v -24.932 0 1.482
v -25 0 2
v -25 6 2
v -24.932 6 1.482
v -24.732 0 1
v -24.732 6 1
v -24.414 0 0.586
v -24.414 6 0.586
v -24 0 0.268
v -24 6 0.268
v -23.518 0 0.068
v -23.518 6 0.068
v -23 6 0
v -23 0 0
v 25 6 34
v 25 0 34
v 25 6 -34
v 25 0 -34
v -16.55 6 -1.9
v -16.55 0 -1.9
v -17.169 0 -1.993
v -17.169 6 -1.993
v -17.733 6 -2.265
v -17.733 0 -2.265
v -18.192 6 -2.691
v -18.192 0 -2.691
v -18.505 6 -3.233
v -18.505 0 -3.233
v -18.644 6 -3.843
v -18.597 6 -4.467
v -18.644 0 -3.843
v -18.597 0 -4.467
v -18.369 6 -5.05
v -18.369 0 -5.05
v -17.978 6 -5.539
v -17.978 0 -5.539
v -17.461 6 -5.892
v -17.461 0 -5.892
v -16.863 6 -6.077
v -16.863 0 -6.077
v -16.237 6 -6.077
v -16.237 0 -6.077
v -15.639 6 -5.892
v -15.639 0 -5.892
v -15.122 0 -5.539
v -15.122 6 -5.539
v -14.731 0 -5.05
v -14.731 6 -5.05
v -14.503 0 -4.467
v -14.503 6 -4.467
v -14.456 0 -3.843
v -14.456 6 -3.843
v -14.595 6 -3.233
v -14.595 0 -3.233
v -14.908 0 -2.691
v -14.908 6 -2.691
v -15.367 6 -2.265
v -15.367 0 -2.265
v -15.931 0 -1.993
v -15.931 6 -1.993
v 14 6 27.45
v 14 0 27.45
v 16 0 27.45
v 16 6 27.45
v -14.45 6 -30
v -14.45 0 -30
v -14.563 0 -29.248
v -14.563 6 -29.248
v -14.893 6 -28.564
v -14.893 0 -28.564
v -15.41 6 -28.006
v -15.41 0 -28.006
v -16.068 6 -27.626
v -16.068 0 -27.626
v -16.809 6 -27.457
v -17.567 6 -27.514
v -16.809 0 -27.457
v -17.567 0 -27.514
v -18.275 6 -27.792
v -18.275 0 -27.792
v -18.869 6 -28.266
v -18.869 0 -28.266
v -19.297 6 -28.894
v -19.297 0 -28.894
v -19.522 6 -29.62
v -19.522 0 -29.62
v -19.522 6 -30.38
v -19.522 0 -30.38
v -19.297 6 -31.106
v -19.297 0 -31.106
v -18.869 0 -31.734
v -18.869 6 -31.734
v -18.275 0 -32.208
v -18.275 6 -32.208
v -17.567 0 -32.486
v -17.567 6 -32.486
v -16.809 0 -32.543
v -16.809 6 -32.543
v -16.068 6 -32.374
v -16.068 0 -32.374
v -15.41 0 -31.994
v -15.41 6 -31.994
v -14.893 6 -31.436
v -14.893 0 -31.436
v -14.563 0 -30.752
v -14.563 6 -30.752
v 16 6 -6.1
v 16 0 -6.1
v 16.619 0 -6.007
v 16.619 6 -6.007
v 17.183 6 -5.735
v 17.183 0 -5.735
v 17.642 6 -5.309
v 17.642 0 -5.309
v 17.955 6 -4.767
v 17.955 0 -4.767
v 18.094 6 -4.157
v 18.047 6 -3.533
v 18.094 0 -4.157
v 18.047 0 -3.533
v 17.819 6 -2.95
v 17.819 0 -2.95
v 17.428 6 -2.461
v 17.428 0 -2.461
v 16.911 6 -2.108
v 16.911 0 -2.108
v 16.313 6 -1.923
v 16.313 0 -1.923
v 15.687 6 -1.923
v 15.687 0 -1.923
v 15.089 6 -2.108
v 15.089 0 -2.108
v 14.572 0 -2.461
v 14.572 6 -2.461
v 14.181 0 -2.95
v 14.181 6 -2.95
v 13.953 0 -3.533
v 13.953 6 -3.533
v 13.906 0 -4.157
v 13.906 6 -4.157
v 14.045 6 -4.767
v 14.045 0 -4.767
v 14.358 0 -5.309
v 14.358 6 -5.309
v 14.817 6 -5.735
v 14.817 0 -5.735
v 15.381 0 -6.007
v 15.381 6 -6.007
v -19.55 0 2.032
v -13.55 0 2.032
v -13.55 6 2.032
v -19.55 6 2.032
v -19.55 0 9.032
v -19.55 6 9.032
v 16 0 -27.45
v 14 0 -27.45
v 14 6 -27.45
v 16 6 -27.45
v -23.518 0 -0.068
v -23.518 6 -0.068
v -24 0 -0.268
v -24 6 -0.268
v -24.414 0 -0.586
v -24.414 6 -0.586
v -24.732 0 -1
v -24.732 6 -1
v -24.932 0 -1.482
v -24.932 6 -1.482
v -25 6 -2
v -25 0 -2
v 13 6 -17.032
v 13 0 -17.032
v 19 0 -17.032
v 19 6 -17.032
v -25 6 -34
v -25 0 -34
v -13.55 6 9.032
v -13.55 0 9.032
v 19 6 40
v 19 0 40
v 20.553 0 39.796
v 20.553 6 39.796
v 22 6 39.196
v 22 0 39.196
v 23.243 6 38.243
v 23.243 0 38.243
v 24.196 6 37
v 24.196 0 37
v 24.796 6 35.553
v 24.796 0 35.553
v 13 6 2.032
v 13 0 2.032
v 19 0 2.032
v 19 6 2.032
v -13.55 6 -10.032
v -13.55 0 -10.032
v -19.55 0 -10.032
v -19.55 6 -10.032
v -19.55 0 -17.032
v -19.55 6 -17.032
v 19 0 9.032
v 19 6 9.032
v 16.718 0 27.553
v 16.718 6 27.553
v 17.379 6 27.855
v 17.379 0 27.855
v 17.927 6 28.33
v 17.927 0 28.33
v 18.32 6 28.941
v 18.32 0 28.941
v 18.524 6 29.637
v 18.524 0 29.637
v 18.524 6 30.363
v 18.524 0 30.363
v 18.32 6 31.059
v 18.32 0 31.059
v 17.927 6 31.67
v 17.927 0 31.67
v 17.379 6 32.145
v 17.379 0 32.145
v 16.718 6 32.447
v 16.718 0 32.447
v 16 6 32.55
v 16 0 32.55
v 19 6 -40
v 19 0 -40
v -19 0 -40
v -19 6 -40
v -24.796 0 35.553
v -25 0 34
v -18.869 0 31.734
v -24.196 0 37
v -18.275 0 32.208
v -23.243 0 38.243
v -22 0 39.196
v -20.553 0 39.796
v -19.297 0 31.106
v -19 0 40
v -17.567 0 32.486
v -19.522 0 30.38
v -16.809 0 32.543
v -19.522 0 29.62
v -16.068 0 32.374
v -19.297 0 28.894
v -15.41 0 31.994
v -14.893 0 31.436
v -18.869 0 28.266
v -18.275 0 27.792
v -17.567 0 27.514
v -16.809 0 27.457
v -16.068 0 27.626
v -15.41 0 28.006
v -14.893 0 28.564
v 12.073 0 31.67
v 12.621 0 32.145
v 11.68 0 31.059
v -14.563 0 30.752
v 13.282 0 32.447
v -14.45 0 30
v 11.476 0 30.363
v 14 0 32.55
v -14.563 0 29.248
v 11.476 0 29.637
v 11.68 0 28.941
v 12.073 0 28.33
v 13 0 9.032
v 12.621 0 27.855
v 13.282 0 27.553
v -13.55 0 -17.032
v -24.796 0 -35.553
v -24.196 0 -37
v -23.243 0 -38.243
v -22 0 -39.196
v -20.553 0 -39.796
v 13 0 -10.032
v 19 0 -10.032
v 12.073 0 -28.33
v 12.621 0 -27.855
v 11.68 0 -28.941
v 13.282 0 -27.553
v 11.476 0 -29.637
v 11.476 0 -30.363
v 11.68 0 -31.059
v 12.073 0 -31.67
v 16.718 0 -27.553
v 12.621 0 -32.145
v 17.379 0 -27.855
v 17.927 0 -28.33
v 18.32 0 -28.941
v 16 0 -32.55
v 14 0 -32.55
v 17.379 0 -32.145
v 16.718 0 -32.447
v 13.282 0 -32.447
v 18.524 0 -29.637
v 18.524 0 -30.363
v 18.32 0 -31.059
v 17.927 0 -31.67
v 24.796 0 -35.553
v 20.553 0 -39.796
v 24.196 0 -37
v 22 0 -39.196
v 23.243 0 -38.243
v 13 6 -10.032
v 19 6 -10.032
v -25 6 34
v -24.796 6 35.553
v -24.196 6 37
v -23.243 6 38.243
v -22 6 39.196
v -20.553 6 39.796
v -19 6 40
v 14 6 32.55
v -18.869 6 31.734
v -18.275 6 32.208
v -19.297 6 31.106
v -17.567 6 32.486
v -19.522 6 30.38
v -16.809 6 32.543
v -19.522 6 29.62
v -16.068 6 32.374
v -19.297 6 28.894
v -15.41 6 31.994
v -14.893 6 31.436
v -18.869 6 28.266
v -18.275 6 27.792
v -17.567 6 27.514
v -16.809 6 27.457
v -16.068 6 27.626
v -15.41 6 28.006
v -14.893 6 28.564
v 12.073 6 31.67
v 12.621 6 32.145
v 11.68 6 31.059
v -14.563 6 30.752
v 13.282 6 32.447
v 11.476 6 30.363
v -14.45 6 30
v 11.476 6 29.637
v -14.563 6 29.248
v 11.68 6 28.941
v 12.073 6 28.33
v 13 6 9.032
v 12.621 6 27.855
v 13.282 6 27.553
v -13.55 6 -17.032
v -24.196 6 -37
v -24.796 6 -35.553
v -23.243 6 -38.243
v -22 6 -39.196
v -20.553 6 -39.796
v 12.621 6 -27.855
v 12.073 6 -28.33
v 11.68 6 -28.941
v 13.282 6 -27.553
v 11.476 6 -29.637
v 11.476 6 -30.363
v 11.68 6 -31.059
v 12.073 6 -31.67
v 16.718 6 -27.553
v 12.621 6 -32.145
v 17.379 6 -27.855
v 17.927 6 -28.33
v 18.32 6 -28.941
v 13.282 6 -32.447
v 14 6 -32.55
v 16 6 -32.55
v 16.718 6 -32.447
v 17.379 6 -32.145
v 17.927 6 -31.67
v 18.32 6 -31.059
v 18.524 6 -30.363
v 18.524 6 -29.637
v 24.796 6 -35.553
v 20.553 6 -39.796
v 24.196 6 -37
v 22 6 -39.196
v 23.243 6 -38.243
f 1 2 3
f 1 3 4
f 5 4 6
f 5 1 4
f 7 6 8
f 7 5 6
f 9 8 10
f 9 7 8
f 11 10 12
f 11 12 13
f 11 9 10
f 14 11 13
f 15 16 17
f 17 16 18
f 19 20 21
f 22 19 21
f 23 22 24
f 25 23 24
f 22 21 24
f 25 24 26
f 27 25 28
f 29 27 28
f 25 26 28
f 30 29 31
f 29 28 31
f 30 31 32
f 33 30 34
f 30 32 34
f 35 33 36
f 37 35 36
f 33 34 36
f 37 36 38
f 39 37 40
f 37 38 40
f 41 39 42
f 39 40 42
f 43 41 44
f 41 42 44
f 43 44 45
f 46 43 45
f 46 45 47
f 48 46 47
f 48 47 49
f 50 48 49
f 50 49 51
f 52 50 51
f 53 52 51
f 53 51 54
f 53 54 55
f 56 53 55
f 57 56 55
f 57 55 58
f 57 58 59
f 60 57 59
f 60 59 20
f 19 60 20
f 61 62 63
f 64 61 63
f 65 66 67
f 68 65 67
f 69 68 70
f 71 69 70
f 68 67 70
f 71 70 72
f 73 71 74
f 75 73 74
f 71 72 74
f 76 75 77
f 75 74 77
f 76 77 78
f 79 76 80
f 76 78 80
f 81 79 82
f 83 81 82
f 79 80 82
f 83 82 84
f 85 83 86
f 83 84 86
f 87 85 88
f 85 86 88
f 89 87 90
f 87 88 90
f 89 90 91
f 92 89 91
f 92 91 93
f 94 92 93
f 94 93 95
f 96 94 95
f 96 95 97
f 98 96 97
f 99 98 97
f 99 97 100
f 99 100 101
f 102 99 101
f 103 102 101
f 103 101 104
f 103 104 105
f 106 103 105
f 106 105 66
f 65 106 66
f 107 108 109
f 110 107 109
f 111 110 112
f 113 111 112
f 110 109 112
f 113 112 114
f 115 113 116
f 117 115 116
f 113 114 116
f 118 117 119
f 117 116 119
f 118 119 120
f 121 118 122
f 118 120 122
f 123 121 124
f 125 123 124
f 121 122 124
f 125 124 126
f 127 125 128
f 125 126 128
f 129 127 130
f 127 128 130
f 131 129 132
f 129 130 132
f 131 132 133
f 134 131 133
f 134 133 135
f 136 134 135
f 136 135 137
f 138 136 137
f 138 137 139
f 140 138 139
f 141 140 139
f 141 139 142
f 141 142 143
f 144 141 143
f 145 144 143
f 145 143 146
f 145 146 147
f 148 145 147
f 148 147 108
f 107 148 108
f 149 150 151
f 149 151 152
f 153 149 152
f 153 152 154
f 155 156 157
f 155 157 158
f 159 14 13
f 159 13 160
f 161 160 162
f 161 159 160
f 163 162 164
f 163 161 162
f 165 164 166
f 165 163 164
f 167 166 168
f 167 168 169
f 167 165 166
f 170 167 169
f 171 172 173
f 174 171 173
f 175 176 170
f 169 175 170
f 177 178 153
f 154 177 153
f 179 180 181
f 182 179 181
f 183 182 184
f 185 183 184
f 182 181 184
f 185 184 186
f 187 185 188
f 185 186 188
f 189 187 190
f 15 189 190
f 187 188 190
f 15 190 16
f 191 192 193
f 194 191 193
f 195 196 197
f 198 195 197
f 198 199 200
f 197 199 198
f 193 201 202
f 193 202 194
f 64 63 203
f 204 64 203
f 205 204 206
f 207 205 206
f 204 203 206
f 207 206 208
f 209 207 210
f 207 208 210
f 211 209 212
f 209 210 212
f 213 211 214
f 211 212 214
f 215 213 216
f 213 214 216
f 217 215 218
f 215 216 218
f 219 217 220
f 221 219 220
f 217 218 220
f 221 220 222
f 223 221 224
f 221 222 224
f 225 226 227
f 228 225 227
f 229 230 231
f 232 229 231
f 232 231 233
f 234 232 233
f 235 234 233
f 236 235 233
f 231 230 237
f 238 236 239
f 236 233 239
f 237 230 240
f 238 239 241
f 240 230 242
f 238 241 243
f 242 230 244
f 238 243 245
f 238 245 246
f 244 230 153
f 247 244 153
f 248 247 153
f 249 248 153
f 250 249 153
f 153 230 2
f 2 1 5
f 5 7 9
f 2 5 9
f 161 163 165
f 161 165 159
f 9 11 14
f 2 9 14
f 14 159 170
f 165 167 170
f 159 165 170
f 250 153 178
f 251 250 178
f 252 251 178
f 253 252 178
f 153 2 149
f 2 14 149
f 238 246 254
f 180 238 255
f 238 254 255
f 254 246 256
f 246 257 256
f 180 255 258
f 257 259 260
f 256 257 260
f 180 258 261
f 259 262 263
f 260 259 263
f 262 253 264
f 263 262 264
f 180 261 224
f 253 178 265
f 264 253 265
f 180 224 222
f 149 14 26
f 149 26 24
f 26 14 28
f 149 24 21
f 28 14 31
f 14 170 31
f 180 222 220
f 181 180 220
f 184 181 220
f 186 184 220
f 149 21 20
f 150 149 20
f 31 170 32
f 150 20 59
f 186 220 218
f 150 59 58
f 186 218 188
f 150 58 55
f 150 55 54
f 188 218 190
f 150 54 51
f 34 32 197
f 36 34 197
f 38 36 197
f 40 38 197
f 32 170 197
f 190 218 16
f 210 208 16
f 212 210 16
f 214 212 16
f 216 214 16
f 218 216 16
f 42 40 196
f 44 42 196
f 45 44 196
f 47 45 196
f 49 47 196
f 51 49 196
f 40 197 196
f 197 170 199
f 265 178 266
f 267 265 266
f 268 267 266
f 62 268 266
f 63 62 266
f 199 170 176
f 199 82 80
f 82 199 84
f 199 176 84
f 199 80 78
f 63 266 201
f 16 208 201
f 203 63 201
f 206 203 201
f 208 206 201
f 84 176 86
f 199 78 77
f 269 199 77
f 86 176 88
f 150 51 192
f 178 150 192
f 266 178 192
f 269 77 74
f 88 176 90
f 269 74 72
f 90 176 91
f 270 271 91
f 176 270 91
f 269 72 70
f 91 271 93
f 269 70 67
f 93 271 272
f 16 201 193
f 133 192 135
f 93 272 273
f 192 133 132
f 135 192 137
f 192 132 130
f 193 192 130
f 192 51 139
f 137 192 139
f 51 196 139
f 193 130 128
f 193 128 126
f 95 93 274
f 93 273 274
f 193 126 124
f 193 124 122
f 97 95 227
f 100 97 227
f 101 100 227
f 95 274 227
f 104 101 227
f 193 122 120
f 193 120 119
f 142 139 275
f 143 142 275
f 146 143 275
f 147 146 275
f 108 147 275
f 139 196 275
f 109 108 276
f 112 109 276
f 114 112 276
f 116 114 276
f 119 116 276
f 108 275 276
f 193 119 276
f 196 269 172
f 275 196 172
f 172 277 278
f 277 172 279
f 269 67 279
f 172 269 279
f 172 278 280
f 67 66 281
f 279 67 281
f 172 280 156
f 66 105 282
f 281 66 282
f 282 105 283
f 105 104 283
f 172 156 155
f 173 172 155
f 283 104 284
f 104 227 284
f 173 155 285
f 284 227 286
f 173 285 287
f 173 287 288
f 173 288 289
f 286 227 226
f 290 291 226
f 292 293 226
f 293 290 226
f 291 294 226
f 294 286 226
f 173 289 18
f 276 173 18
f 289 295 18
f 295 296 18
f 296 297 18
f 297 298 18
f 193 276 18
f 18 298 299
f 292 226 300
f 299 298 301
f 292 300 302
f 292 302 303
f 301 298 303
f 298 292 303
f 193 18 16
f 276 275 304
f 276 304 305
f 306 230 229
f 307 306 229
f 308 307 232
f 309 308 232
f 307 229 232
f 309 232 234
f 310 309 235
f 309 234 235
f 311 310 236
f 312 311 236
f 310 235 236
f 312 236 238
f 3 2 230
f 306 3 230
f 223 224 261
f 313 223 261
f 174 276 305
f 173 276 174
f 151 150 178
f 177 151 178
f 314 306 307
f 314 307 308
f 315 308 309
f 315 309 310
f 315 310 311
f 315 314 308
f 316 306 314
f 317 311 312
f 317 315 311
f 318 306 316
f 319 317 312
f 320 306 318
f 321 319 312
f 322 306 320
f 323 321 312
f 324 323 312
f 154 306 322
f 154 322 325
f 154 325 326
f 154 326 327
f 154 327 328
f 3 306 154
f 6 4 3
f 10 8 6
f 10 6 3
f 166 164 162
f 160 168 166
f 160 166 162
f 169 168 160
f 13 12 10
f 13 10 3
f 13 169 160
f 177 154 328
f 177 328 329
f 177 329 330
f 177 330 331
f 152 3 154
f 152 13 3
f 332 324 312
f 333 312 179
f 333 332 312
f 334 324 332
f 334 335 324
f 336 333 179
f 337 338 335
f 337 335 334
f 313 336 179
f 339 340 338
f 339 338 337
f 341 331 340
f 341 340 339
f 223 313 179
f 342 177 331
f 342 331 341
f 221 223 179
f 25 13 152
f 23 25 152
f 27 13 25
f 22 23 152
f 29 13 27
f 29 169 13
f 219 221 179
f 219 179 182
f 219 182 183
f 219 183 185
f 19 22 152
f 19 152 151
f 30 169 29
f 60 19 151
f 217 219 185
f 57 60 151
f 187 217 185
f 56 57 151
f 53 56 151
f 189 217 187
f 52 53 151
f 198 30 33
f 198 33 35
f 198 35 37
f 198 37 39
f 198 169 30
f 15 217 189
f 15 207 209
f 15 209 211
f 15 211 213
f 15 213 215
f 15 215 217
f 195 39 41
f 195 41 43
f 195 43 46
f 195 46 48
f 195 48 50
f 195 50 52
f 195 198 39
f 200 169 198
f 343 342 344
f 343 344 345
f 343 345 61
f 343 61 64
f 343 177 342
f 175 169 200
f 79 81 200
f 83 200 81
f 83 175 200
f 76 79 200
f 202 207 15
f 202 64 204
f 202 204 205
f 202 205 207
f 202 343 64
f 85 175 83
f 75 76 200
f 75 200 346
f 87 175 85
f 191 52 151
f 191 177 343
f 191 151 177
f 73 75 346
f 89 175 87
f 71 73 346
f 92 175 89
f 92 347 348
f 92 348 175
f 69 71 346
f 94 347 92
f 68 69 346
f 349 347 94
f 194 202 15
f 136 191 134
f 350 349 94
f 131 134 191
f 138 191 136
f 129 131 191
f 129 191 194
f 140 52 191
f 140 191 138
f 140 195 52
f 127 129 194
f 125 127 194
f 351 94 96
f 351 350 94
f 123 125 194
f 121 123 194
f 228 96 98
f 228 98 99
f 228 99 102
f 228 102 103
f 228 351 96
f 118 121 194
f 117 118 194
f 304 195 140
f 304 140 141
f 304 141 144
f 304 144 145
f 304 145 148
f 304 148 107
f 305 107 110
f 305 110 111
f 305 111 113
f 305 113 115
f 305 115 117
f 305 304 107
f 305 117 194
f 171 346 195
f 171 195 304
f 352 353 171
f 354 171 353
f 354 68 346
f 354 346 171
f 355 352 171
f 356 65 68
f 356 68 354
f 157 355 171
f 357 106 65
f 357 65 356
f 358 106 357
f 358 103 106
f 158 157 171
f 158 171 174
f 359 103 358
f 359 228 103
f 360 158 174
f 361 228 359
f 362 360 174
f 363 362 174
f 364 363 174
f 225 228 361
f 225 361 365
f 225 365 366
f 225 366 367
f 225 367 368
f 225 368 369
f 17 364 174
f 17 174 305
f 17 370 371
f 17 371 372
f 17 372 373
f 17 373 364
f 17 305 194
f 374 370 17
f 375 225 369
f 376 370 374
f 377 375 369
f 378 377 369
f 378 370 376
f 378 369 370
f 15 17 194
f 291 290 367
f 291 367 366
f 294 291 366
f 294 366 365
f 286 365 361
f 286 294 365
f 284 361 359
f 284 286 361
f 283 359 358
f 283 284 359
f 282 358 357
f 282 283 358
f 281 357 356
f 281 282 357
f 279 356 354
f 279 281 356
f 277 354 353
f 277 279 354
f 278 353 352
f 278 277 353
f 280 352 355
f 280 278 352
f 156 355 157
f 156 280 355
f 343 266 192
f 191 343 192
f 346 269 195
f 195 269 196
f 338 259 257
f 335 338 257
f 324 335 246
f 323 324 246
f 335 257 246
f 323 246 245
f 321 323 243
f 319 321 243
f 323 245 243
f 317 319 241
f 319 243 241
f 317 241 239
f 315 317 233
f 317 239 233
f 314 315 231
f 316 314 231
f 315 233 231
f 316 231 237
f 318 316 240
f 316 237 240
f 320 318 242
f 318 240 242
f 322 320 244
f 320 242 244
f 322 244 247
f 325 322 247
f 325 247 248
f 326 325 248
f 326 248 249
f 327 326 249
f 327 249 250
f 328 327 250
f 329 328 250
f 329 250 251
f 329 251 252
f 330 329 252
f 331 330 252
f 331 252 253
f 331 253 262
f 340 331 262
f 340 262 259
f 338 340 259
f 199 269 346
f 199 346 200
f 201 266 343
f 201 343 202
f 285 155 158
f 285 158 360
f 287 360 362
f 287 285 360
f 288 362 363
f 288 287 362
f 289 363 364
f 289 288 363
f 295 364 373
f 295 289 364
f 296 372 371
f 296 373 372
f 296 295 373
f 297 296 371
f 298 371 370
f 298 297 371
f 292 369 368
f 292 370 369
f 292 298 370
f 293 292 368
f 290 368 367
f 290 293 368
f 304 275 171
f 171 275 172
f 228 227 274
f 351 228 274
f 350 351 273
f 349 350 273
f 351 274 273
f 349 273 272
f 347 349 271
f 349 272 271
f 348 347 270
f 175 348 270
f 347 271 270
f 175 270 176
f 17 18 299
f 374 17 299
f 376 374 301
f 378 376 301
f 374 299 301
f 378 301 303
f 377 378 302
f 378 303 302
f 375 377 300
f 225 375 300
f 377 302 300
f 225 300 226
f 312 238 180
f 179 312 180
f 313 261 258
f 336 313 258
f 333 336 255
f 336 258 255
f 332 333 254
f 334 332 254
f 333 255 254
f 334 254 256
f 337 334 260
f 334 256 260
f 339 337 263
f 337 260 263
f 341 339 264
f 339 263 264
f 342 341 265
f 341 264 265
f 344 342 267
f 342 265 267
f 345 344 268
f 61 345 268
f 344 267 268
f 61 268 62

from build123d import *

# Parameters (mm, degrees)
EXTRUDE_1_DEPTH      = 6
SKETCH_2_R           = 2.55
CUT_EXTRUDE_1_DEPTH  = 7
CUT_EXTRUDE_2_DEPTH  = 7
SKETCH_31_R          = 2.1
SKETCH_31_W          = 7
SKETCH_31_H          = 6
CUT_EXTRUDE_11_DEPTH = 7
SKETCH_32_R          = 2.1
SKETCH_32_W          = 7
SKETCH_32_H          = 6
CUT_EXTRUDE_12_DEPTH = 7


with BuildPart() as part:
    # Эскиз1 → Бобышка-Вытянуть1 (new body)
    with BuildSketch(Plane(origin=(0, 0, 0), x_dir=(1, 0, 0), z_dir=(0, 1, 0))):
        with BuildLine():
            Line((-19, -40), (19, -40))
            ThreePointArc((19, -40), (23.242640687, -38.242640687), (25, -34))
            Line((25, -34), (25, 34))
            ThreePointArc((25, 34), (23.242640687, 38.242640687), (19, 40))
            Line((19, 40), (-19, 40))
            ThreePointArc((-19, 40), (-23.242640687, 38.242640687), (-25, 34))
            Line((-25, 34), (-25, -34))
            ThreePointArc((-25, -34), (-23.242640687, -38.242640687), (-19, -40))
        make_face()
    extrude(amount=EXTRUDE_1_DEPTH)

    # Эскиз2 → Вырез-Вытянуть1 (cut, through all)
    with BuildSketch(Plane.XZ):
        with Locations((-17, -30)):
            Circle(SKETCH_2_R)
        with Locations((-17, 30)):
            Circle(SKETCH_2_R)
        with BuildLine():
            Line((16, -32.55), (14, -32.55))
            ThreePointArc((14, -32.55), (11.45, -30), (14, -27.45))
            Line((14, -27.45), (16, -27.45))
            ThreePointArc((16, -27.45), (18.55, -30), (16, -32.55))
        make_face()
        with BuildLine():
            Line((16, 32.55), (14, 32.55))
            ThreePointArc((14, 32.55), (11.45, 30), (14, 27.45))
            Line((14, 27.45), (16, 27.45))
            ThreePointArc((16, 27.45), (18.55, 30), (16, 32.55))
        make_face()
    extrude(amount=-CUT_EXTRUDE_1_DEPTH, mode=Mode.SUBTRACT)

    # Эскиз3 → Вырез-Вытянуть2 (cut, through all)
    with BuildSketch(Plane.XZ):
        with BuildLine():
            Line((-25, -2), (-25, 2))
            ThreePointArc((-25, 2), (-24.414213562, 0.585786438), (-23, 0))
            ThreePointArc((-23, 0), (-24.414213562, -0.585786438), (-25, -2))
        make_face()
    extrude(amount=-CUT_EXTRUDE_2_DEPTH, mode=Mode.SUBTRACT)

    # Эскиз31 → Вырез-Вытянуть11 (cut, through all)
    with BuildSketch(Plane(origin=(30.45, 0, -4), x_dir=(0, 0, 1), z_dir=(0, -1, 0))):
        with Locations((0, 47)):
            Circle(SKETCH_31_R)
        with Locations((9.531849908, 47)):
            Rectangle(SKETCH_31_W, SKETCH_31_H)
        with Locations((-9.531849908, 47)):
            Rectangle(SKETCH_31_W, SKETCH_31_H)
    extrude(amount=-CUT_EXTRUDE_11_DEPTH, mode=Mode.SUBTRACT)

    # Эскиз32 → Вырез-Вытянуть12 (cut, through all)
    with BuildSketch(Plane(origin=(-31, 0, -4), x_dir=(0, 0, -1), z_dir=(0, -1, 0))):
        with Locations((0, 47)):
            Circle(SKETCH_32_R)
        with Locations((9.531849908, 47)):
            Rectangle(SKETCH_32_W, SKETCH_32_H)
        with Locations((-9.531849908, 47)):
            Rectangle(SKETCH_32_W, SKETCH_32_H)
    extrude(amount=-CUT_EXTRUDE_12_DEPTH, mode=Mode.SUBTRACT)


solid = part.part
